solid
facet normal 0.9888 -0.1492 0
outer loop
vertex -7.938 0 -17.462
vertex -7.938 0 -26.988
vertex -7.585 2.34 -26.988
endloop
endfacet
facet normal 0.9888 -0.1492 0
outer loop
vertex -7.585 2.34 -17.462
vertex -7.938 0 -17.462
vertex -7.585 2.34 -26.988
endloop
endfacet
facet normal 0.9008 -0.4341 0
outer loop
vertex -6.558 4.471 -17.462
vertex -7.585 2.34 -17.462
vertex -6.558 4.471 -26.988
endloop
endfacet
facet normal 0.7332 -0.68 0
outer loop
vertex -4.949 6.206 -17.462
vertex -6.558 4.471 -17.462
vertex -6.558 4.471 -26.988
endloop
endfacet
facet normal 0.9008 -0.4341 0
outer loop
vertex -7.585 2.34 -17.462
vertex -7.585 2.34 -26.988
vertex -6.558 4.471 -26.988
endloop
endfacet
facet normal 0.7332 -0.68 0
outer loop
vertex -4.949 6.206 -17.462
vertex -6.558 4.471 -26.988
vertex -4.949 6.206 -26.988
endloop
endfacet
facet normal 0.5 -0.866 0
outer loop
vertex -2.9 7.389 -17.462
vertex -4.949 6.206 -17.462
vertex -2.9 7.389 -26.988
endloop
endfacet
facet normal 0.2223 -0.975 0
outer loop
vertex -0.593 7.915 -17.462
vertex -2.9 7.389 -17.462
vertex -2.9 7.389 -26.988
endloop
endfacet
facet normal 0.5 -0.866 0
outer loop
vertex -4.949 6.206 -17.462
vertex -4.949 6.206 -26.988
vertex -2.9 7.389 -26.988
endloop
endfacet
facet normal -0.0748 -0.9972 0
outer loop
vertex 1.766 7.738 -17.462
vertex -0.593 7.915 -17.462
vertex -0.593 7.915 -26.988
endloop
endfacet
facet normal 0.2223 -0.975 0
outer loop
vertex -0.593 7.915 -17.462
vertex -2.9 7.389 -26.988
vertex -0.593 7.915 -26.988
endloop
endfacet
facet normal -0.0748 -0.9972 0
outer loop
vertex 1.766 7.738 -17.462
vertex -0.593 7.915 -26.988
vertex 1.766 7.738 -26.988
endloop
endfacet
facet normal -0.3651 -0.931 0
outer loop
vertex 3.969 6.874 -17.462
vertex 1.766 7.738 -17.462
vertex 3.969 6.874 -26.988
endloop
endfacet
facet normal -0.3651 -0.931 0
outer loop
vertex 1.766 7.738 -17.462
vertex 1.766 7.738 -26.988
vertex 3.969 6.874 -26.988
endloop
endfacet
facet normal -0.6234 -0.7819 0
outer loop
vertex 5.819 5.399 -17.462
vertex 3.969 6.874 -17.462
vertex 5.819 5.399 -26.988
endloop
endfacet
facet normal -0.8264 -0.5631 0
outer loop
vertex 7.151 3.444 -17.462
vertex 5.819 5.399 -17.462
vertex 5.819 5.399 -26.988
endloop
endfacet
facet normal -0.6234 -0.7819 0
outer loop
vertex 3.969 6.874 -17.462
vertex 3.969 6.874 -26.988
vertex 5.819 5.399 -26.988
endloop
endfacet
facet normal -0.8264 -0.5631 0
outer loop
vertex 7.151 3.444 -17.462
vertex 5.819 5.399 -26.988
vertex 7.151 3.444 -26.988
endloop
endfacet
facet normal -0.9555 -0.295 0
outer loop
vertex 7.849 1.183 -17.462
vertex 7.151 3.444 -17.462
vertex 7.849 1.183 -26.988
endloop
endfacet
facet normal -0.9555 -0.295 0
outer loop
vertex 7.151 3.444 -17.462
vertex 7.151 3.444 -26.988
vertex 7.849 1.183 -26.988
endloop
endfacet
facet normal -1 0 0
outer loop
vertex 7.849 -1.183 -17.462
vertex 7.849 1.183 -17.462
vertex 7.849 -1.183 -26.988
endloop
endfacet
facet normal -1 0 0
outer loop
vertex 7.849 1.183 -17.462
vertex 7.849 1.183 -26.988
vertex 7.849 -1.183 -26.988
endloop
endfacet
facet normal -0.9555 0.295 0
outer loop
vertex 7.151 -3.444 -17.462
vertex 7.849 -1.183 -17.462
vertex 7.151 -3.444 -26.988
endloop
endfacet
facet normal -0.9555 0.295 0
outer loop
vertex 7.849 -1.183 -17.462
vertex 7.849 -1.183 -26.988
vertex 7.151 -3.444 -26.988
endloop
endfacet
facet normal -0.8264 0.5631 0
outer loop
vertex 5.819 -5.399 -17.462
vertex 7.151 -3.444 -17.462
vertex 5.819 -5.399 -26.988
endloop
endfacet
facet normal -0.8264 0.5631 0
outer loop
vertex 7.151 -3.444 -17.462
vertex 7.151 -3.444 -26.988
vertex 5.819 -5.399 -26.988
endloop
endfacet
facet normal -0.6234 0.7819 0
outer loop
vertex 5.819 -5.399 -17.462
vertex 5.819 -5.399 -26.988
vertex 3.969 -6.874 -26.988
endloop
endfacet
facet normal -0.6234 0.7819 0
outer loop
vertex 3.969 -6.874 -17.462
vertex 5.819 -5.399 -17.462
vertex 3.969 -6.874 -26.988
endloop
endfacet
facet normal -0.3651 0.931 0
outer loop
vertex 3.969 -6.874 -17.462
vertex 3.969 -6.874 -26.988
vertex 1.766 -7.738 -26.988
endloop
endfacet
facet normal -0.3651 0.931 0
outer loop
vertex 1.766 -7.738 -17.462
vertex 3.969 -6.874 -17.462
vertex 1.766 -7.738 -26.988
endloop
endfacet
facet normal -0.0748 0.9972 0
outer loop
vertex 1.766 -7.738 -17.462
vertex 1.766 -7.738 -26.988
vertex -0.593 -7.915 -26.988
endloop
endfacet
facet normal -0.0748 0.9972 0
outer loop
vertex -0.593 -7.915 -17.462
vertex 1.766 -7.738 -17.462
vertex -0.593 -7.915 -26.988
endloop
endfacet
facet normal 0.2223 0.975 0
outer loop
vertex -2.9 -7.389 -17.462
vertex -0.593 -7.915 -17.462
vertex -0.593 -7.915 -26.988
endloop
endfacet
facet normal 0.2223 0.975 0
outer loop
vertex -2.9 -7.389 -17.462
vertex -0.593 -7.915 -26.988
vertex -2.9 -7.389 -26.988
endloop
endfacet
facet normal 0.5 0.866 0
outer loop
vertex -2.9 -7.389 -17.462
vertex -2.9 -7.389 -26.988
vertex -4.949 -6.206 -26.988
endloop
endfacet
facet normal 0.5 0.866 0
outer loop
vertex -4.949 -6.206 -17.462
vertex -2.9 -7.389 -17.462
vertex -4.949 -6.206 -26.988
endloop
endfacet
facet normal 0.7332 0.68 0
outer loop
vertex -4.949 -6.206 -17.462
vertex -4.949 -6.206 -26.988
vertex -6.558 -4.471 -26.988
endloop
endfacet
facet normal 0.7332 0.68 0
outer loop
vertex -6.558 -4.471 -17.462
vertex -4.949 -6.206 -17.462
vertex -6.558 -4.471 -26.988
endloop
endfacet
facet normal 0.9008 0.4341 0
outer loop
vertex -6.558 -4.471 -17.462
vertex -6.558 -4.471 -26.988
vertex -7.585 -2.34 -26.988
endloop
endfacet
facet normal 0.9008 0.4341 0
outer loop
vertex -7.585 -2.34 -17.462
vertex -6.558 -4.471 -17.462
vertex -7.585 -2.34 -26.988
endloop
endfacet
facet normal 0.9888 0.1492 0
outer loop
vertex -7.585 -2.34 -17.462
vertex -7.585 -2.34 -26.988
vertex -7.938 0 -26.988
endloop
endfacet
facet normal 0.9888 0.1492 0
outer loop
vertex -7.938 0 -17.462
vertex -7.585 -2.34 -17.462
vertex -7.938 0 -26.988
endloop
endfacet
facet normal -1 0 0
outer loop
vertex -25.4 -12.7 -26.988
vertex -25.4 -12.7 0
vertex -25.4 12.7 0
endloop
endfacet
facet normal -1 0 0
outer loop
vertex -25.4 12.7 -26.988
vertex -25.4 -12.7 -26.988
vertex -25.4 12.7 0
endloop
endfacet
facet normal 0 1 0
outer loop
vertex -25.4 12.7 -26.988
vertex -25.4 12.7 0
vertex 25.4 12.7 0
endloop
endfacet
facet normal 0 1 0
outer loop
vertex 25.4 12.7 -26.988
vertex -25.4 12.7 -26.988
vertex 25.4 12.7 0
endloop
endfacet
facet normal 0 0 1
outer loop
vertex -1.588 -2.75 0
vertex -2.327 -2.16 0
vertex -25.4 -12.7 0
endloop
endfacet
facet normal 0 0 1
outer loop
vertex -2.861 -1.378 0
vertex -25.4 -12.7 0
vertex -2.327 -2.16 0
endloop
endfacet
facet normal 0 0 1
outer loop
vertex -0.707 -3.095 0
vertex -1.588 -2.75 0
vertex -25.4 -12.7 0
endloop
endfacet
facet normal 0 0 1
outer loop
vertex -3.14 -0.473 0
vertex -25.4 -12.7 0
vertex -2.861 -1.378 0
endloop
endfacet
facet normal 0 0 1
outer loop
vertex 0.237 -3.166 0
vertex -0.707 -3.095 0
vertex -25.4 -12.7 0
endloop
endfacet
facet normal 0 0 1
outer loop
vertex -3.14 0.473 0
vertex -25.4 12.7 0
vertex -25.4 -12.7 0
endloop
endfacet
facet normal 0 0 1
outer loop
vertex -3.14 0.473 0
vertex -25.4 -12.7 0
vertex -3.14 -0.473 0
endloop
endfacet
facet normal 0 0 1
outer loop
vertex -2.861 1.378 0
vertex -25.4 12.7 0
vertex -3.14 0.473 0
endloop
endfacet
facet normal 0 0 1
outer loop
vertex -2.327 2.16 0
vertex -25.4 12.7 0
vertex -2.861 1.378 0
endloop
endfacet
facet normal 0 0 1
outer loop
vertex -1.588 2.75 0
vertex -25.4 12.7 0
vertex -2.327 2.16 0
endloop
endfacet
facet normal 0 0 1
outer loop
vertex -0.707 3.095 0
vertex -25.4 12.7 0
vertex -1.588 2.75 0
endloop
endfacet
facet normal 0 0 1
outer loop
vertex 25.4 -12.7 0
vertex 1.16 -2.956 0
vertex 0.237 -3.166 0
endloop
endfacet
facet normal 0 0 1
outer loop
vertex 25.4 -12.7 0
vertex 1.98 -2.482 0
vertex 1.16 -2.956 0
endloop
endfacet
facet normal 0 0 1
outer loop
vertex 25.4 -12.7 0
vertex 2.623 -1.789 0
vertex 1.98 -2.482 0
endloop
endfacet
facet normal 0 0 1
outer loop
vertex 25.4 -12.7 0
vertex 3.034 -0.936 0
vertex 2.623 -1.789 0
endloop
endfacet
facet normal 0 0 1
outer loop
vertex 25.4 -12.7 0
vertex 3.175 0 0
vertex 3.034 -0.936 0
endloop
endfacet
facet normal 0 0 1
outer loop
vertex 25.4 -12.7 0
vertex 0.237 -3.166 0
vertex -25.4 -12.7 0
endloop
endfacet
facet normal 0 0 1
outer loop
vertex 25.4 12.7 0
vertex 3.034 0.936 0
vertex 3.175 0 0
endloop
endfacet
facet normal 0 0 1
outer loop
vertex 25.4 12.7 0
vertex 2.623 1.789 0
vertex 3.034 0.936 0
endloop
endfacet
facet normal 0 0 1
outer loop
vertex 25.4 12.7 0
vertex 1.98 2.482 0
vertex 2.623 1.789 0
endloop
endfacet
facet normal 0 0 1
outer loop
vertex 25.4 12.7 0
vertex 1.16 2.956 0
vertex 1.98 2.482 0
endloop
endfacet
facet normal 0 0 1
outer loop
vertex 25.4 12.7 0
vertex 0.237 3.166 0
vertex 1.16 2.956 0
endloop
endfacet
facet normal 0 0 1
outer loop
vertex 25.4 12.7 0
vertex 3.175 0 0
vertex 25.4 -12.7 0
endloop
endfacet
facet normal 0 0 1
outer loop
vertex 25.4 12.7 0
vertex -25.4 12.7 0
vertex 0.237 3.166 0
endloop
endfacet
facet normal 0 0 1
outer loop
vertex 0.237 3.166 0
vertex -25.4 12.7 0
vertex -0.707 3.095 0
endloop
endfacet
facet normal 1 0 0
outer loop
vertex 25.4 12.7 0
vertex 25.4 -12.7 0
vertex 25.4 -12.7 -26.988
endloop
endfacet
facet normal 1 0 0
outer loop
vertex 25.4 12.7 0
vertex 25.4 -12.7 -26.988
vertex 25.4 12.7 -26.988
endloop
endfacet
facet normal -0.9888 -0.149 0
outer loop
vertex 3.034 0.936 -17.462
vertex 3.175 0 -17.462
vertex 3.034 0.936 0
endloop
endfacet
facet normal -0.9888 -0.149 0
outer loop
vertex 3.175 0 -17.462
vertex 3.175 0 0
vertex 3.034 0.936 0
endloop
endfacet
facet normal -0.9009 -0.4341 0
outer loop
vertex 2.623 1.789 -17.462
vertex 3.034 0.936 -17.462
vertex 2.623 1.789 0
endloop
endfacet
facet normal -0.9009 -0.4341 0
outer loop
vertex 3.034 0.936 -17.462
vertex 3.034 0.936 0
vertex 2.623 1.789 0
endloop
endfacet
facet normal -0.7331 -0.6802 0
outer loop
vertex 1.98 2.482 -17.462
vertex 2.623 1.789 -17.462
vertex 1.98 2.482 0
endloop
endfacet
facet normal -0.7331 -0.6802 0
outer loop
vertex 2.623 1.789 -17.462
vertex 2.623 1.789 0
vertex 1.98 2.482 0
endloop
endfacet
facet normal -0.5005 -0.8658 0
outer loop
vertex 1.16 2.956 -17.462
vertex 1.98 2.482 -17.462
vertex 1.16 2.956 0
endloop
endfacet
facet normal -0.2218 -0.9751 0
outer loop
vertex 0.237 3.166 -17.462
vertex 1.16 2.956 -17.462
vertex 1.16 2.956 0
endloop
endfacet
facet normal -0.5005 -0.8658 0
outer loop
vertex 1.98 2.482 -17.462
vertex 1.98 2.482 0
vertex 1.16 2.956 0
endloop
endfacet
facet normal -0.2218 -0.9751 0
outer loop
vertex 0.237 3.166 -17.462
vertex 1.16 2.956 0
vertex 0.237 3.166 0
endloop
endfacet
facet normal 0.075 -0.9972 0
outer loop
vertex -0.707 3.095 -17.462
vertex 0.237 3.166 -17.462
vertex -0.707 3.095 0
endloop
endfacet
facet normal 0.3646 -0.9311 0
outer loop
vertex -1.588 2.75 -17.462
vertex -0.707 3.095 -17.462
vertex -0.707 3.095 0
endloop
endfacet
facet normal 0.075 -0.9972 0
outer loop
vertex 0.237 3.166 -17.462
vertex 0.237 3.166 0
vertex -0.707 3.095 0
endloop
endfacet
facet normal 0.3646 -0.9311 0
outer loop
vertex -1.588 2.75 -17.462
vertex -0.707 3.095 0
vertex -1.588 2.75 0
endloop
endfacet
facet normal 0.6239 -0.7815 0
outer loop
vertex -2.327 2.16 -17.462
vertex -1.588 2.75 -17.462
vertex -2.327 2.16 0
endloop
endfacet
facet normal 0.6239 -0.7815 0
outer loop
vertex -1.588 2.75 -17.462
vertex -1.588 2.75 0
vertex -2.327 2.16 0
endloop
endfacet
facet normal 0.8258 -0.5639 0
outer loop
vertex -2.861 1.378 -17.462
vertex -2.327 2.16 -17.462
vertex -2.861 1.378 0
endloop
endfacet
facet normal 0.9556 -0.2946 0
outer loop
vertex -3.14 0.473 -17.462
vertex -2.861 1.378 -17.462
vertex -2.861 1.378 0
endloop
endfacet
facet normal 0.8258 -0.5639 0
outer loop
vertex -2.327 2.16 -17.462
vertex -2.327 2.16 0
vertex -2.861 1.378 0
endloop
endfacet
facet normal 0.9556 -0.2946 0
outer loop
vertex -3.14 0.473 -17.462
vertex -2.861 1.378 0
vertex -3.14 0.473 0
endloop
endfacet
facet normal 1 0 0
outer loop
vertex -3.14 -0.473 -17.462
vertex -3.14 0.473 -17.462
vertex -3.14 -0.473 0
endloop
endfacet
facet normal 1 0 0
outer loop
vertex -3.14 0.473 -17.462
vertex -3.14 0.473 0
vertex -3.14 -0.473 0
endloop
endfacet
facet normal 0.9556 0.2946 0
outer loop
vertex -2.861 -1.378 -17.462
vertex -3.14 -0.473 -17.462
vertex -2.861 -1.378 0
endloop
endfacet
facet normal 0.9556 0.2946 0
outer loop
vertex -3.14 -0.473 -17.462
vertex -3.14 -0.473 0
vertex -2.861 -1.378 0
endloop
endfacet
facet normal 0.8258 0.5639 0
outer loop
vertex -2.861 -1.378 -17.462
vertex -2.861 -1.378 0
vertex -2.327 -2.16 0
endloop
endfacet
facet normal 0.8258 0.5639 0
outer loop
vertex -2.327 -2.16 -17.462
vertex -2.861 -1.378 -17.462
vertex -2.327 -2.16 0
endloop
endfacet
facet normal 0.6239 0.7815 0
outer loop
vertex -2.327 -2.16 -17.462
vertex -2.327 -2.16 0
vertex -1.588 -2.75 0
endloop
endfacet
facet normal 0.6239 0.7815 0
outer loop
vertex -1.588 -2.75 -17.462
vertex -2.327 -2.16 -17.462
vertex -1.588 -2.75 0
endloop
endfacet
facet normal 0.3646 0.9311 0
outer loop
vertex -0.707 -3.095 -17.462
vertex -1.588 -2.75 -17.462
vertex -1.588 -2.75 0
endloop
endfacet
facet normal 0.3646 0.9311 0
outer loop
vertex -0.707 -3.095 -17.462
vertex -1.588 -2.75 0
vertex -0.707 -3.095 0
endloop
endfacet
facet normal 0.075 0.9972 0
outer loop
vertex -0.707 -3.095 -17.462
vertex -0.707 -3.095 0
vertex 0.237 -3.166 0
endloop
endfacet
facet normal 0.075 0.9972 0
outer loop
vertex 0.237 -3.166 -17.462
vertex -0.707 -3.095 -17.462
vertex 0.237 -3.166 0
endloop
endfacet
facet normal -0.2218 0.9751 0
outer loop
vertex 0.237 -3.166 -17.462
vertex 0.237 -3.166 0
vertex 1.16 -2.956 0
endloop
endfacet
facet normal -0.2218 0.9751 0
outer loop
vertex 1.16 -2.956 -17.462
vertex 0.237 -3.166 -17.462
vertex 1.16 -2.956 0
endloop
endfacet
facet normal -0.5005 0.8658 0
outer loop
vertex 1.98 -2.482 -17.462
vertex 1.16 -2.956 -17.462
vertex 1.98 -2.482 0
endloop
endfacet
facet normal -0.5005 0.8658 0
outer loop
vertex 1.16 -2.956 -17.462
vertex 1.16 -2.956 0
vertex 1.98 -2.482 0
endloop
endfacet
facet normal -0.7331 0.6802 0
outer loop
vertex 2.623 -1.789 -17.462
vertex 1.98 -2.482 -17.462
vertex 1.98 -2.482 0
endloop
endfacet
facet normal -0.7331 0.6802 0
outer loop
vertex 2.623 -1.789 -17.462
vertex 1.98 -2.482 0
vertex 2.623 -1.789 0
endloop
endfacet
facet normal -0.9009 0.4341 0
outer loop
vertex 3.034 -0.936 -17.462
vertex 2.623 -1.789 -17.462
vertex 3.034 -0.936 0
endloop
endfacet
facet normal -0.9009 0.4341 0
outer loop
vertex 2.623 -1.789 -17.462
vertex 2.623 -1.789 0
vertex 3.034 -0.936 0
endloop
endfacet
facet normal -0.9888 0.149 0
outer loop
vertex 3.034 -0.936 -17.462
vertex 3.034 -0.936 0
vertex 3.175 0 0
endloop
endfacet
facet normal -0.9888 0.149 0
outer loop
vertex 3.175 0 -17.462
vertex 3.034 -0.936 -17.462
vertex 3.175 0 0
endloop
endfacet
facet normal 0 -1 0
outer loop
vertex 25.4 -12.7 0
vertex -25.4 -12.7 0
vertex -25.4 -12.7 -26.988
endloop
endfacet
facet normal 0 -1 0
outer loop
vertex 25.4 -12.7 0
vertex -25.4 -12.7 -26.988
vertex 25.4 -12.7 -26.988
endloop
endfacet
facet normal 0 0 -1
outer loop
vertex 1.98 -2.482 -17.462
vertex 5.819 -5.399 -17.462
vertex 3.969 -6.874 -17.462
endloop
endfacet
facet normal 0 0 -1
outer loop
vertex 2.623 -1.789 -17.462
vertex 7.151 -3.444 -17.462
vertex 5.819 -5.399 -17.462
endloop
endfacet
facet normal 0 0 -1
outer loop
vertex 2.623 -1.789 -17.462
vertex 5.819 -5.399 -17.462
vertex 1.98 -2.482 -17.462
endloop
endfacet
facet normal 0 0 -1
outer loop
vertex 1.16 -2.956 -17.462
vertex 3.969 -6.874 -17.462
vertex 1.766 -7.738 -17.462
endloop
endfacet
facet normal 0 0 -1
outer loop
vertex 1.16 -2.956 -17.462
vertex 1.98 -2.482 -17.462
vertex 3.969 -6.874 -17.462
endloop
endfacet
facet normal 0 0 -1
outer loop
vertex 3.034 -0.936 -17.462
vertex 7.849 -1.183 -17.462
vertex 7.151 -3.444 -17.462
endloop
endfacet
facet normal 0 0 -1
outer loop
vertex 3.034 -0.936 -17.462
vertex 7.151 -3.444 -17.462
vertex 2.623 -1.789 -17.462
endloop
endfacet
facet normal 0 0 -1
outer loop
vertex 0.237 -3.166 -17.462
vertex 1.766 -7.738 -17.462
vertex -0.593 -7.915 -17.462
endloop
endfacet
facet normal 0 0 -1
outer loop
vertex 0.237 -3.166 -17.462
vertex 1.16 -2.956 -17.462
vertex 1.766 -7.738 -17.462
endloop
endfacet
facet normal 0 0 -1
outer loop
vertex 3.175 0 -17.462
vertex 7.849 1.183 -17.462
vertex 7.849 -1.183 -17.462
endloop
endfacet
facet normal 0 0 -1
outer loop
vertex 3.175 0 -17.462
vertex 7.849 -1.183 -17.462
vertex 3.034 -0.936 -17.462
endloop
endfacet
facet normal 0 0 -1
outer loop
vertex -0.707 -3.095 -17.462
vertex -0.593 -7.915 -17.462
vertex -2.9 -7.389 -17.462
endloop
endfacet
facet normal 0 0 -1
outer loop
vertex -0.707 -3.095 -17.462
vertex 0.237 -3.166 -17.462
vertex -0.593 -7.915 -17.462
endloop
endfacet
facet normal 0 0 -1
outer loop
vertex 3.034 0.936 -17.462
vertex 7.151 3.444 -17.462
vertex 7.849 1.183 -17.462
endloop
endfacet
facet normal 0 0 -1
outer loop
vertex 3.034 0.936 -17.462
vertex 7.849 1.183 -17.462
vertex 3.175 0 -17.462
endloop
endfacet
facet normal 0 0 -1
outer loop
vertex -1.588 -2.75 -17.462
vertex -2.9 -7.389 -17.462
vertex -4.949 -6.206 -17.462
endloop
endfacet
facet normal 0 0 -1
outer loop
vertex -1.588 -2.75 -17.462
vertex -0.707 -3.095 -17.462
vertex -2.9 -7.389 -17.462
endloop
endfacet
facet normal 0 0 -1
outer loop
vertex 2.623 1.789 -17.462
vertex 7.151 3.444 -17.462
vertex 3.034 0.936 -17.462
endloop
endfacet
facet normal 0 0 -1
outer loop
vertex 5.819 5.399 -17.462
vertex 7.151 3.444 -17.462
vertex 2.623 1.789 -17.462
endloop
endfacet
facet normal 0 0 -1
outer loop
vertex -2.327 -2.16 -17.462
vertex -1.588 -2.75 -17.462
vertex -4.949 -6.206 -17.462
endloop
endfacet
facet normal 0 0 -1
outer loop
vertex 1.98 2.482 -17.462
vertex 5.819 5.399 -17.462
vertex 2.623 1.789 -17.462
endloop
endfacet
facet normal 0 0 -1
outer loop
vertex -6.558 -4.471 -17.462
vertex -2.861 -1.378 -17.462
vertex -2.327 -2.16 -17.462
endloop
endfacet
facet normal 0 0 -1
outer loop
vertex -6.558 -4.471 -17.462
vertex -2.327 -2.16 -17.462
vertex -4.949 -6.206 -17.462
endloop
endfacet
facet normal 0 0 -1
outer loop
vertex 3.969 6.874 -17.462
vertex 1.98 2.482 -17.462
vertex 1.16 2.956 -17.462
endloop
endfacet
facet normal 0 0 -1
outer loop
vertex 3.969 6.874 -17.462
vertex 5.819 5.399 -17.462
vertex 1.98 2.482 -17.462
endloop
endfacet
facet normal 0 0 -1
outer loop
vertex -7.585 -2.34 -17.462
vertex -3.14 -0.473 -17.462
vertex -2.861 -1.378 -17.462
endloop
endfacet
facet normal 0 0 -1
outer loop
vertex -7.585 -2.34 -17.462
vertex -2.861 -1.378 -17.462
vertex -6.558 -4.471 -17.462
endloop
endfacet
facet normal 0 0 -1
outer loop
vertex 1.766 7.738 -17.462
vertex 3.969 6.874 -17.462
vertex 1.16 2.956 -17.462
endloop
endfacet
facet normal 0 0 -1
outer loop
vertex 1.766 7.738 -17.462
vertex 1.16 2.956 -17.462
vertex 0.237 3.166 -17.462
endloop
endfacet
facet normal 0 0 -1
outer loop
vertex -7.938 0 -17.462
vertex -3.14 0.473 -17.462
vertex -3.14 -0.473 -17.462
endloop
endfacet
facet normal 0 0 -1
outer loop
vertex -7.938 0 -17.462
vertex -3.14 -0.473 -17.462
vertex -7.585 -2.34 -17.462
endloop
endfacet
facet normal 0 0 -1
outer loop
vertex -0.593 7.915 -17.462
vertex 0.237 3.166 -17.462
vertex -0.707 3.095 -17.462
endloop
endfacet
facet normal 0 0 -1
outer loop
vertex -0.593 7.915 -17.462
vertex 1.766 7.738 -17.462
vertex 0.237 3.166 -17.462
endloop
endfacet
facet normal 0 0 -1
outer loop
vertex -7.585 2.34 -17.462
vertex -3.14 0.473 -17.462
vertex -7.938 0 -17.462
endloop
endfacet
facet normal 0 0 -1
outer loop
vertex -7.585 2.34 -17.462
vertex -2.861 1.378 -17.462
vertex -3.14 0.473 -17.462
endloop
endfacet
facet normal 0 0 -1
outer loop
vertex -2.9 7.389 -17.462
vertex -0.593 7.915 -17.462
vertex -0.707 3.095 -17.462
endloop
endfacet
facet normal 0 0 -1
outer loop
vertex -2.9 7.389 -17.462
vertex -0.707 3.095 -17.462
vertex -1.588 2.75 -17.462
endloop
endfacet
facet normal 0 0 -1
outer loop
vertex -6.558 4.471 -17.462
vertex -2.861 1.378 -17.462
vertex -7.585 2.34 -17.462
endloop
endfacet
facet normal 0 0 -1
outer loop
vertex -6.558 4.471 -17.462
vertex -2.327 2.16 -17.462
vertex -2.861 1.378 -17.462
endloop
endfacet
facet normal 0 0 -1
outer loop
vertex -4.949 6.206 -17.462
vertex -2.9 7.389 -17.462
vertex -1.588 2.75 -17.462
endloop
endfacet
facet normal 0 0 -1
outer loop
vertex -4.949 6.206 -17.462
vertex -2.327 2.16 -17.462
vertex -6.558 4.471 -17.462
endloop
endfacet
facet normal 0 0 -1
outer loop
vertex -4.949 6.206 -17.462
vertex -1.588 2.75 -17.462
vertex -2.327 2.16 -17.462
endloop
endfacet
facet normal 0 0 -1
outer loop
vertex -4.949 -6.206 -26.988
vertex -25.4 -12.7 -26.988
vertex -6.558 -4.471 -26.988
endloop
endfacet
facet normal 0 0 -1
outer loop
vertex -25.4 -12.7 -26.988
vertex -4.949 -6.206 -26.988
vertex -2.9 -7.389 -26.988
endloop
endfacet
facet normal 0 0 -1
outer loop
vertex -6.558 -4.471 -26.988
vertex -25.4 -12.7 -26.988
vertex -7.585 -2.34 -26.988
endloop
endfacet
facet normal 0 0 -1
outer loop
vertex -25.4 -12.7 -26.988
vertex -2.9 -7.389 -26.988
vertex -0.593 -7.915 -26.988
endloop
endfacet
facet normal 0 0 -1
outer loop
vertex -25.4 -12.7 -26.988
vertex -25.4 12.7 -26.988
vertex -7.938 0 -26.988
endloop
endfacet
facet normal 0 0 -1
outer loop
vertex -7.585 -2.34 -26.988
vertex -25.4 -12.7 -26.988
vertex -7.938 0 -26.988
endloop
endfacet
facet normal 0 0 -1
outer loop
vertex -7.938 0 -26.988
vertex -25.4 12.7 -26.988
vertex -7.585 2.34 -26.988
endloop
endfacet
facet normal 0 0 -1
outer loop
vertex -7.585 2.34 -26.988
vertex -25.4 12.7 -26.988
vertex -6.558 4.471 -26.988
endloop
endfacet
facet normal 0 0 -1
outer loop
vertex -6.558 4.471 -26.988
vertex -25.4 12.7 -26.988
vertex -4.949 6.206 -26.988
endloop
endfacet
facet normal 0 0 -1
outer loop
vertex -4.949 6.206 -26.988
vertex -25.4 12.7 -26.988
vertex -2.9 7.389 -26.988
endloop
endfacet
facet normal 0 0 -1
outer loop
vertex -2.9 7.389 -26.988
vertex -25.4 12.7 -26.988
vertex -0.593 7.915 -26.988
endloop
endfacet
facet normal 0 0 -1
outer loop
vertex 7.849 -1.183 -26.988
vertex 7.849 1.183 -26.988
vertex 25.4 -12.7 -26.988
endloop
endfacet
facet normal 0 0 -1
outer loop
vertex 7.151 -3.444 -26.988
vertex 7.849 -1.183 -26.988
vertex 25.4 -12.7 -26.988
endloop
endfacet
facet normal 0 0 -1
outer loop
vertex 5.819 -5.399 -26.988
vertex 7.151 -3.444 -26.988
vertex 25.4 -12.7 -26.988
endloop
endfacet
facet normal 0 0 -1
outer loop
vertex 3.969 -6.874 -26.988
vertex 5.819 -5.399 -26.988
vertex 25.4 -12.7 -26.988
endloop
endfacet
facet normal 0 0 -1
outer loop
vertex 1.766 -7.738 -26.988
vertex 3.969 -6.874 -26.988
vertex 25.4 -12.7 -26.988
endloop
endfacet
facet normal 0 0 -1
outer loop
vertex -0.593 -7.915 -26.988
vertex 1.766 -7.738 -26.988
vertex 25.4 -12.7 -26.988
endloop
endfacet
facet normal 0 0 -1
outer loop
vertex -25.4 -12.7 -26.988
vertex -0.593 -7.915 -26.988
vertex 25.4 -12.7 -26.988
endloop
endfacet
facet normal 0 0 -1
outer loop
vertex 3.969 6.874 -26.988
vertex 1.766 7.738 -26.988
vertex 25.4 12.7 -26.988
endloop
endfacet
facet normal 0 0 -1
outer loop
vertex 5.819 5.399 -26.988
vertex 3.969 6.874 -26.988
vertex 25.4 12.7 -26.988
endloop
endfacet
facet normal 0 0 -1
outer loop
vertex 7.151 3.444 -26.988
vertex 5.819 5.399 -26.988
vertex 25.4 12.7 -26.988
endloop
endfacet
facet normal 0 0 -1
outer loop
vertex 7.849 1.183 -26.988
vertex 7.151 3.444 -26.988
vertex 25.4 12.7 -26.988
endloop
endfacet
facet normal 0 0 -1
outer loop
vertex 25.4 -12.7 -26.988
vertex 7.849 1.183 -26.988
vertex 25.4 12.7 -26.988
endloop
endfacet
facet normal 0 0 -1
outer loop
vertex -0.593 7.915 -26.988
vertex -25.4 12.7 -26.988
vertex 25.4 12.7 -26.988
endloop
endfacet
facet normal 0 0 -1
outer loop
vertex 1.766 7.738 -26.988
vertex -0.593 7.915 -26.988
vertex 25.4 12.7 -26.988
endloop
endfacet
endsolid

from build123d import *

# Parameters (mm, degrees)
SKETCH1_W                                           = 50.8
SKETCH1_H                                           = 25.4
BOSS_EXTRUDE1_DEPTH                                 = 26.9875
CBORE_FOR_0_BINDING_HEAD_MACHINE_SCREW1_D           = 6.35
CBORE_FOR_0_BINDING_HEAD_MACHINE_SCREW1_CBORE_D     = 15.875
CBORE_FOR_0_BINDING_HEAD_MACHINE_SCREW1_CBORE_DEPTH = 9.525


with BuildPart() as part:
    # Sketch1 → Boss-Extrude1 (new body)
    with BuildSketch(Plane.XY):
        Rectangle(SKETCH1_W, SKETCH1_H)
    extrude(amount=-BOSS_EXTRUDE1_DEPTH)

    # CBORE for #0 Binding Head Machine Screw1 (through all)
    with Locations(Plane(origin=(0, 0, -26.9875), x_dir=(-1, 0, 0), z_dir=(0, 0, -1))):
        with Locations((0, 0)):
            CounterBoreHole(CBORE_FOR_0_BINDING_HEAD_MACHINE_SCREW1_D / 2, CBORE_FOR_0_BINDING_HEAD_MACHINE_SCREW1_CBORE_D / 2, CBORE_FOR_0_BINDING_HEAD_MACHINE_SCREW1_CBORE_DEPTH)


solid = part.part
